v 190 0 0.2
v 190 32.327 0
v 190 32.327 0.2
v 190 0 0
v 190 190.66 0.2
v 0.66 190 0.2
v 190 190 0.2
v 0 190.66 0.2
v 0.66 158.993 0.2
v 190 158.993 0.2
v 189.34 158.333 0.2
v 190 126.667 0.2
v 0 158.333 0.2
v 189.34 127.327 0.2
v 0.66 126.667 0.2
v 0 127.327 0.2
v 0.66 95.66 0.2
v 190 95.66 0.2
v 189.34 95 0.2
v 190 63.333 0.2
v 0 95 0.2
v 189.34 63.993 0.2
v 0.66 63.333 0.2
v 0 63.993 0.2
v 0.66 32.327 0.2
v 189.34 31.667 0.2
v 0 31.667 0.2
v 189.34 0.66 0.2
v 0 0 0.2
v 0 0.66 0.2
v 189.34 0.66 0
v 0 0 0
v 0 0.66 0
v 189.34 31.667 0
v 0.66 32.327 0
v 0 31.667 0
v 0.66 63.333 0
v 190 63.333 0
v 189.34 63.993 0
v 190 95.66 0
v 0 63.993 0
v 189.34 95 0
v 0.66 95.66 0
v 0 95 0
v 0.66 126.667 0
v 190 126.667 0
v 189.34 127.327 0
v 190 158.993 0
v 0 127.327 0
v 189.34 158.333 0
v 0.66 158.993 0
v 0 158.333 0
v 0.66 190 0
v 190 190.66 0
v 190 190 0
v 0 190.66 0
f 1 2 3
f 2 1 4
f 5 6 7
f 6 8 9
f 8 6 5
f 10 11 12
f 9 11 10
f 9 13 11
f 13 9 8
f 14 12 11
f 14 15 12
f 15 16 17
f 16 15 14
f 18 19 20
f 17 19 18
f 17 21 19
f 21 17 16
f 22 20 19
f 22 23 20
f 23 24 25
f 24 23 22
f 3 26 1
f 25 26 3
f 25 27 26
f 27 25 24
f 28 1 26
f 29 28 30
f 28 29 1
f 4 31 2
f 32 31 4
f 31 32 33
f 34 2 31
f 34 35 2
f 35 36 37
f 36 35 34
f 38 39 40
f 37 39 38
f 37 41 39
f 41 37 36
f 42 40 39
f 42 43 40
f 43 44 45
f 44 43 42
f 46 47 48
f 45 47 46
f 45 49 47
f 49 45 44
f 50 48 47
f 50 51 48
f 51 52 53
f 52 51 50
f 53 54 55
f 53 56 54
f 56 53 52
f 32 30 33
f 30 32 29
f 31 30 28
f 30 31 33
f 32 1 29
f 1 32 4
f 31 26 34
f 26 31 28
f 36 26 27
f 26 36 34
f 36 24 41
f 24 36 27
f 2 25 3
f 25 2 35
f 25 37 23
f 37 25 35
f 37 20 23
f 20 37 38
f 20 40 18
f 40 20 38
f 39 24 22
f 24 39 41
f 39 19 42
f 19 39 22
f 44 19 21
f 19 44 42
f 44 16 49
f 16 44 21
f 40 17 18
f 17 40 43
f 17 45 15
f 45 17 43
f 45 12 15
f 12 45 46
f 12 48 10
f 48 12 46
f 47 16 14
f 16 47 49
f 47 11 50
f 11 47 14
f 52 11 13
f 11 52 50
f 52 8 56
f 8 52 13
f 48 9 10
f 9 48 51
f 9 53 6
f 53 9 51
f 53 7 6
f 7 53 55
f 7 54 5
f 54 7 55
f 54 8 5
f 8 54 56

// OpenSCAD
bed_x = 200-10;
bed_y = 200-10;

nozzle = 0.66;

layer = 0.2;

y = bed_y/6;

cube([bed_x, nozzle, layer]);
translate([bed_x-nozzle,0,0]) cube([nozzle, y, layer]);
translate([0,y,0]) cube([bed_x,nozzle,layer]);
translate([0,y,0]) cube([nozzle, y, layer]);
translate([0,2*y,0]) cube([bed_x,nozzle,layer]);
translate([bed_x-nozzle,2*y,0]) cube([nozzle, y, layer]);
translate([0,3*y,0]) cube([bed_x,nozzle,layer]);
translate([0,3*y,0]) cube([nozzle, y, layer]);
translate([0,4*y,0]) cube([bed_x,nozzle,layer]);
translate([bed_x-nozzle,4*y,0]) cube([nozzle, y, layer]);
translate([0,5*y,0]) cube([bed_x,nozzle,layer]);
translate([0,5*y,0]) cube([nozzle, y, layer]);
translate([0,6*y,0]) cube([bed_x,nozzle,layer]);
